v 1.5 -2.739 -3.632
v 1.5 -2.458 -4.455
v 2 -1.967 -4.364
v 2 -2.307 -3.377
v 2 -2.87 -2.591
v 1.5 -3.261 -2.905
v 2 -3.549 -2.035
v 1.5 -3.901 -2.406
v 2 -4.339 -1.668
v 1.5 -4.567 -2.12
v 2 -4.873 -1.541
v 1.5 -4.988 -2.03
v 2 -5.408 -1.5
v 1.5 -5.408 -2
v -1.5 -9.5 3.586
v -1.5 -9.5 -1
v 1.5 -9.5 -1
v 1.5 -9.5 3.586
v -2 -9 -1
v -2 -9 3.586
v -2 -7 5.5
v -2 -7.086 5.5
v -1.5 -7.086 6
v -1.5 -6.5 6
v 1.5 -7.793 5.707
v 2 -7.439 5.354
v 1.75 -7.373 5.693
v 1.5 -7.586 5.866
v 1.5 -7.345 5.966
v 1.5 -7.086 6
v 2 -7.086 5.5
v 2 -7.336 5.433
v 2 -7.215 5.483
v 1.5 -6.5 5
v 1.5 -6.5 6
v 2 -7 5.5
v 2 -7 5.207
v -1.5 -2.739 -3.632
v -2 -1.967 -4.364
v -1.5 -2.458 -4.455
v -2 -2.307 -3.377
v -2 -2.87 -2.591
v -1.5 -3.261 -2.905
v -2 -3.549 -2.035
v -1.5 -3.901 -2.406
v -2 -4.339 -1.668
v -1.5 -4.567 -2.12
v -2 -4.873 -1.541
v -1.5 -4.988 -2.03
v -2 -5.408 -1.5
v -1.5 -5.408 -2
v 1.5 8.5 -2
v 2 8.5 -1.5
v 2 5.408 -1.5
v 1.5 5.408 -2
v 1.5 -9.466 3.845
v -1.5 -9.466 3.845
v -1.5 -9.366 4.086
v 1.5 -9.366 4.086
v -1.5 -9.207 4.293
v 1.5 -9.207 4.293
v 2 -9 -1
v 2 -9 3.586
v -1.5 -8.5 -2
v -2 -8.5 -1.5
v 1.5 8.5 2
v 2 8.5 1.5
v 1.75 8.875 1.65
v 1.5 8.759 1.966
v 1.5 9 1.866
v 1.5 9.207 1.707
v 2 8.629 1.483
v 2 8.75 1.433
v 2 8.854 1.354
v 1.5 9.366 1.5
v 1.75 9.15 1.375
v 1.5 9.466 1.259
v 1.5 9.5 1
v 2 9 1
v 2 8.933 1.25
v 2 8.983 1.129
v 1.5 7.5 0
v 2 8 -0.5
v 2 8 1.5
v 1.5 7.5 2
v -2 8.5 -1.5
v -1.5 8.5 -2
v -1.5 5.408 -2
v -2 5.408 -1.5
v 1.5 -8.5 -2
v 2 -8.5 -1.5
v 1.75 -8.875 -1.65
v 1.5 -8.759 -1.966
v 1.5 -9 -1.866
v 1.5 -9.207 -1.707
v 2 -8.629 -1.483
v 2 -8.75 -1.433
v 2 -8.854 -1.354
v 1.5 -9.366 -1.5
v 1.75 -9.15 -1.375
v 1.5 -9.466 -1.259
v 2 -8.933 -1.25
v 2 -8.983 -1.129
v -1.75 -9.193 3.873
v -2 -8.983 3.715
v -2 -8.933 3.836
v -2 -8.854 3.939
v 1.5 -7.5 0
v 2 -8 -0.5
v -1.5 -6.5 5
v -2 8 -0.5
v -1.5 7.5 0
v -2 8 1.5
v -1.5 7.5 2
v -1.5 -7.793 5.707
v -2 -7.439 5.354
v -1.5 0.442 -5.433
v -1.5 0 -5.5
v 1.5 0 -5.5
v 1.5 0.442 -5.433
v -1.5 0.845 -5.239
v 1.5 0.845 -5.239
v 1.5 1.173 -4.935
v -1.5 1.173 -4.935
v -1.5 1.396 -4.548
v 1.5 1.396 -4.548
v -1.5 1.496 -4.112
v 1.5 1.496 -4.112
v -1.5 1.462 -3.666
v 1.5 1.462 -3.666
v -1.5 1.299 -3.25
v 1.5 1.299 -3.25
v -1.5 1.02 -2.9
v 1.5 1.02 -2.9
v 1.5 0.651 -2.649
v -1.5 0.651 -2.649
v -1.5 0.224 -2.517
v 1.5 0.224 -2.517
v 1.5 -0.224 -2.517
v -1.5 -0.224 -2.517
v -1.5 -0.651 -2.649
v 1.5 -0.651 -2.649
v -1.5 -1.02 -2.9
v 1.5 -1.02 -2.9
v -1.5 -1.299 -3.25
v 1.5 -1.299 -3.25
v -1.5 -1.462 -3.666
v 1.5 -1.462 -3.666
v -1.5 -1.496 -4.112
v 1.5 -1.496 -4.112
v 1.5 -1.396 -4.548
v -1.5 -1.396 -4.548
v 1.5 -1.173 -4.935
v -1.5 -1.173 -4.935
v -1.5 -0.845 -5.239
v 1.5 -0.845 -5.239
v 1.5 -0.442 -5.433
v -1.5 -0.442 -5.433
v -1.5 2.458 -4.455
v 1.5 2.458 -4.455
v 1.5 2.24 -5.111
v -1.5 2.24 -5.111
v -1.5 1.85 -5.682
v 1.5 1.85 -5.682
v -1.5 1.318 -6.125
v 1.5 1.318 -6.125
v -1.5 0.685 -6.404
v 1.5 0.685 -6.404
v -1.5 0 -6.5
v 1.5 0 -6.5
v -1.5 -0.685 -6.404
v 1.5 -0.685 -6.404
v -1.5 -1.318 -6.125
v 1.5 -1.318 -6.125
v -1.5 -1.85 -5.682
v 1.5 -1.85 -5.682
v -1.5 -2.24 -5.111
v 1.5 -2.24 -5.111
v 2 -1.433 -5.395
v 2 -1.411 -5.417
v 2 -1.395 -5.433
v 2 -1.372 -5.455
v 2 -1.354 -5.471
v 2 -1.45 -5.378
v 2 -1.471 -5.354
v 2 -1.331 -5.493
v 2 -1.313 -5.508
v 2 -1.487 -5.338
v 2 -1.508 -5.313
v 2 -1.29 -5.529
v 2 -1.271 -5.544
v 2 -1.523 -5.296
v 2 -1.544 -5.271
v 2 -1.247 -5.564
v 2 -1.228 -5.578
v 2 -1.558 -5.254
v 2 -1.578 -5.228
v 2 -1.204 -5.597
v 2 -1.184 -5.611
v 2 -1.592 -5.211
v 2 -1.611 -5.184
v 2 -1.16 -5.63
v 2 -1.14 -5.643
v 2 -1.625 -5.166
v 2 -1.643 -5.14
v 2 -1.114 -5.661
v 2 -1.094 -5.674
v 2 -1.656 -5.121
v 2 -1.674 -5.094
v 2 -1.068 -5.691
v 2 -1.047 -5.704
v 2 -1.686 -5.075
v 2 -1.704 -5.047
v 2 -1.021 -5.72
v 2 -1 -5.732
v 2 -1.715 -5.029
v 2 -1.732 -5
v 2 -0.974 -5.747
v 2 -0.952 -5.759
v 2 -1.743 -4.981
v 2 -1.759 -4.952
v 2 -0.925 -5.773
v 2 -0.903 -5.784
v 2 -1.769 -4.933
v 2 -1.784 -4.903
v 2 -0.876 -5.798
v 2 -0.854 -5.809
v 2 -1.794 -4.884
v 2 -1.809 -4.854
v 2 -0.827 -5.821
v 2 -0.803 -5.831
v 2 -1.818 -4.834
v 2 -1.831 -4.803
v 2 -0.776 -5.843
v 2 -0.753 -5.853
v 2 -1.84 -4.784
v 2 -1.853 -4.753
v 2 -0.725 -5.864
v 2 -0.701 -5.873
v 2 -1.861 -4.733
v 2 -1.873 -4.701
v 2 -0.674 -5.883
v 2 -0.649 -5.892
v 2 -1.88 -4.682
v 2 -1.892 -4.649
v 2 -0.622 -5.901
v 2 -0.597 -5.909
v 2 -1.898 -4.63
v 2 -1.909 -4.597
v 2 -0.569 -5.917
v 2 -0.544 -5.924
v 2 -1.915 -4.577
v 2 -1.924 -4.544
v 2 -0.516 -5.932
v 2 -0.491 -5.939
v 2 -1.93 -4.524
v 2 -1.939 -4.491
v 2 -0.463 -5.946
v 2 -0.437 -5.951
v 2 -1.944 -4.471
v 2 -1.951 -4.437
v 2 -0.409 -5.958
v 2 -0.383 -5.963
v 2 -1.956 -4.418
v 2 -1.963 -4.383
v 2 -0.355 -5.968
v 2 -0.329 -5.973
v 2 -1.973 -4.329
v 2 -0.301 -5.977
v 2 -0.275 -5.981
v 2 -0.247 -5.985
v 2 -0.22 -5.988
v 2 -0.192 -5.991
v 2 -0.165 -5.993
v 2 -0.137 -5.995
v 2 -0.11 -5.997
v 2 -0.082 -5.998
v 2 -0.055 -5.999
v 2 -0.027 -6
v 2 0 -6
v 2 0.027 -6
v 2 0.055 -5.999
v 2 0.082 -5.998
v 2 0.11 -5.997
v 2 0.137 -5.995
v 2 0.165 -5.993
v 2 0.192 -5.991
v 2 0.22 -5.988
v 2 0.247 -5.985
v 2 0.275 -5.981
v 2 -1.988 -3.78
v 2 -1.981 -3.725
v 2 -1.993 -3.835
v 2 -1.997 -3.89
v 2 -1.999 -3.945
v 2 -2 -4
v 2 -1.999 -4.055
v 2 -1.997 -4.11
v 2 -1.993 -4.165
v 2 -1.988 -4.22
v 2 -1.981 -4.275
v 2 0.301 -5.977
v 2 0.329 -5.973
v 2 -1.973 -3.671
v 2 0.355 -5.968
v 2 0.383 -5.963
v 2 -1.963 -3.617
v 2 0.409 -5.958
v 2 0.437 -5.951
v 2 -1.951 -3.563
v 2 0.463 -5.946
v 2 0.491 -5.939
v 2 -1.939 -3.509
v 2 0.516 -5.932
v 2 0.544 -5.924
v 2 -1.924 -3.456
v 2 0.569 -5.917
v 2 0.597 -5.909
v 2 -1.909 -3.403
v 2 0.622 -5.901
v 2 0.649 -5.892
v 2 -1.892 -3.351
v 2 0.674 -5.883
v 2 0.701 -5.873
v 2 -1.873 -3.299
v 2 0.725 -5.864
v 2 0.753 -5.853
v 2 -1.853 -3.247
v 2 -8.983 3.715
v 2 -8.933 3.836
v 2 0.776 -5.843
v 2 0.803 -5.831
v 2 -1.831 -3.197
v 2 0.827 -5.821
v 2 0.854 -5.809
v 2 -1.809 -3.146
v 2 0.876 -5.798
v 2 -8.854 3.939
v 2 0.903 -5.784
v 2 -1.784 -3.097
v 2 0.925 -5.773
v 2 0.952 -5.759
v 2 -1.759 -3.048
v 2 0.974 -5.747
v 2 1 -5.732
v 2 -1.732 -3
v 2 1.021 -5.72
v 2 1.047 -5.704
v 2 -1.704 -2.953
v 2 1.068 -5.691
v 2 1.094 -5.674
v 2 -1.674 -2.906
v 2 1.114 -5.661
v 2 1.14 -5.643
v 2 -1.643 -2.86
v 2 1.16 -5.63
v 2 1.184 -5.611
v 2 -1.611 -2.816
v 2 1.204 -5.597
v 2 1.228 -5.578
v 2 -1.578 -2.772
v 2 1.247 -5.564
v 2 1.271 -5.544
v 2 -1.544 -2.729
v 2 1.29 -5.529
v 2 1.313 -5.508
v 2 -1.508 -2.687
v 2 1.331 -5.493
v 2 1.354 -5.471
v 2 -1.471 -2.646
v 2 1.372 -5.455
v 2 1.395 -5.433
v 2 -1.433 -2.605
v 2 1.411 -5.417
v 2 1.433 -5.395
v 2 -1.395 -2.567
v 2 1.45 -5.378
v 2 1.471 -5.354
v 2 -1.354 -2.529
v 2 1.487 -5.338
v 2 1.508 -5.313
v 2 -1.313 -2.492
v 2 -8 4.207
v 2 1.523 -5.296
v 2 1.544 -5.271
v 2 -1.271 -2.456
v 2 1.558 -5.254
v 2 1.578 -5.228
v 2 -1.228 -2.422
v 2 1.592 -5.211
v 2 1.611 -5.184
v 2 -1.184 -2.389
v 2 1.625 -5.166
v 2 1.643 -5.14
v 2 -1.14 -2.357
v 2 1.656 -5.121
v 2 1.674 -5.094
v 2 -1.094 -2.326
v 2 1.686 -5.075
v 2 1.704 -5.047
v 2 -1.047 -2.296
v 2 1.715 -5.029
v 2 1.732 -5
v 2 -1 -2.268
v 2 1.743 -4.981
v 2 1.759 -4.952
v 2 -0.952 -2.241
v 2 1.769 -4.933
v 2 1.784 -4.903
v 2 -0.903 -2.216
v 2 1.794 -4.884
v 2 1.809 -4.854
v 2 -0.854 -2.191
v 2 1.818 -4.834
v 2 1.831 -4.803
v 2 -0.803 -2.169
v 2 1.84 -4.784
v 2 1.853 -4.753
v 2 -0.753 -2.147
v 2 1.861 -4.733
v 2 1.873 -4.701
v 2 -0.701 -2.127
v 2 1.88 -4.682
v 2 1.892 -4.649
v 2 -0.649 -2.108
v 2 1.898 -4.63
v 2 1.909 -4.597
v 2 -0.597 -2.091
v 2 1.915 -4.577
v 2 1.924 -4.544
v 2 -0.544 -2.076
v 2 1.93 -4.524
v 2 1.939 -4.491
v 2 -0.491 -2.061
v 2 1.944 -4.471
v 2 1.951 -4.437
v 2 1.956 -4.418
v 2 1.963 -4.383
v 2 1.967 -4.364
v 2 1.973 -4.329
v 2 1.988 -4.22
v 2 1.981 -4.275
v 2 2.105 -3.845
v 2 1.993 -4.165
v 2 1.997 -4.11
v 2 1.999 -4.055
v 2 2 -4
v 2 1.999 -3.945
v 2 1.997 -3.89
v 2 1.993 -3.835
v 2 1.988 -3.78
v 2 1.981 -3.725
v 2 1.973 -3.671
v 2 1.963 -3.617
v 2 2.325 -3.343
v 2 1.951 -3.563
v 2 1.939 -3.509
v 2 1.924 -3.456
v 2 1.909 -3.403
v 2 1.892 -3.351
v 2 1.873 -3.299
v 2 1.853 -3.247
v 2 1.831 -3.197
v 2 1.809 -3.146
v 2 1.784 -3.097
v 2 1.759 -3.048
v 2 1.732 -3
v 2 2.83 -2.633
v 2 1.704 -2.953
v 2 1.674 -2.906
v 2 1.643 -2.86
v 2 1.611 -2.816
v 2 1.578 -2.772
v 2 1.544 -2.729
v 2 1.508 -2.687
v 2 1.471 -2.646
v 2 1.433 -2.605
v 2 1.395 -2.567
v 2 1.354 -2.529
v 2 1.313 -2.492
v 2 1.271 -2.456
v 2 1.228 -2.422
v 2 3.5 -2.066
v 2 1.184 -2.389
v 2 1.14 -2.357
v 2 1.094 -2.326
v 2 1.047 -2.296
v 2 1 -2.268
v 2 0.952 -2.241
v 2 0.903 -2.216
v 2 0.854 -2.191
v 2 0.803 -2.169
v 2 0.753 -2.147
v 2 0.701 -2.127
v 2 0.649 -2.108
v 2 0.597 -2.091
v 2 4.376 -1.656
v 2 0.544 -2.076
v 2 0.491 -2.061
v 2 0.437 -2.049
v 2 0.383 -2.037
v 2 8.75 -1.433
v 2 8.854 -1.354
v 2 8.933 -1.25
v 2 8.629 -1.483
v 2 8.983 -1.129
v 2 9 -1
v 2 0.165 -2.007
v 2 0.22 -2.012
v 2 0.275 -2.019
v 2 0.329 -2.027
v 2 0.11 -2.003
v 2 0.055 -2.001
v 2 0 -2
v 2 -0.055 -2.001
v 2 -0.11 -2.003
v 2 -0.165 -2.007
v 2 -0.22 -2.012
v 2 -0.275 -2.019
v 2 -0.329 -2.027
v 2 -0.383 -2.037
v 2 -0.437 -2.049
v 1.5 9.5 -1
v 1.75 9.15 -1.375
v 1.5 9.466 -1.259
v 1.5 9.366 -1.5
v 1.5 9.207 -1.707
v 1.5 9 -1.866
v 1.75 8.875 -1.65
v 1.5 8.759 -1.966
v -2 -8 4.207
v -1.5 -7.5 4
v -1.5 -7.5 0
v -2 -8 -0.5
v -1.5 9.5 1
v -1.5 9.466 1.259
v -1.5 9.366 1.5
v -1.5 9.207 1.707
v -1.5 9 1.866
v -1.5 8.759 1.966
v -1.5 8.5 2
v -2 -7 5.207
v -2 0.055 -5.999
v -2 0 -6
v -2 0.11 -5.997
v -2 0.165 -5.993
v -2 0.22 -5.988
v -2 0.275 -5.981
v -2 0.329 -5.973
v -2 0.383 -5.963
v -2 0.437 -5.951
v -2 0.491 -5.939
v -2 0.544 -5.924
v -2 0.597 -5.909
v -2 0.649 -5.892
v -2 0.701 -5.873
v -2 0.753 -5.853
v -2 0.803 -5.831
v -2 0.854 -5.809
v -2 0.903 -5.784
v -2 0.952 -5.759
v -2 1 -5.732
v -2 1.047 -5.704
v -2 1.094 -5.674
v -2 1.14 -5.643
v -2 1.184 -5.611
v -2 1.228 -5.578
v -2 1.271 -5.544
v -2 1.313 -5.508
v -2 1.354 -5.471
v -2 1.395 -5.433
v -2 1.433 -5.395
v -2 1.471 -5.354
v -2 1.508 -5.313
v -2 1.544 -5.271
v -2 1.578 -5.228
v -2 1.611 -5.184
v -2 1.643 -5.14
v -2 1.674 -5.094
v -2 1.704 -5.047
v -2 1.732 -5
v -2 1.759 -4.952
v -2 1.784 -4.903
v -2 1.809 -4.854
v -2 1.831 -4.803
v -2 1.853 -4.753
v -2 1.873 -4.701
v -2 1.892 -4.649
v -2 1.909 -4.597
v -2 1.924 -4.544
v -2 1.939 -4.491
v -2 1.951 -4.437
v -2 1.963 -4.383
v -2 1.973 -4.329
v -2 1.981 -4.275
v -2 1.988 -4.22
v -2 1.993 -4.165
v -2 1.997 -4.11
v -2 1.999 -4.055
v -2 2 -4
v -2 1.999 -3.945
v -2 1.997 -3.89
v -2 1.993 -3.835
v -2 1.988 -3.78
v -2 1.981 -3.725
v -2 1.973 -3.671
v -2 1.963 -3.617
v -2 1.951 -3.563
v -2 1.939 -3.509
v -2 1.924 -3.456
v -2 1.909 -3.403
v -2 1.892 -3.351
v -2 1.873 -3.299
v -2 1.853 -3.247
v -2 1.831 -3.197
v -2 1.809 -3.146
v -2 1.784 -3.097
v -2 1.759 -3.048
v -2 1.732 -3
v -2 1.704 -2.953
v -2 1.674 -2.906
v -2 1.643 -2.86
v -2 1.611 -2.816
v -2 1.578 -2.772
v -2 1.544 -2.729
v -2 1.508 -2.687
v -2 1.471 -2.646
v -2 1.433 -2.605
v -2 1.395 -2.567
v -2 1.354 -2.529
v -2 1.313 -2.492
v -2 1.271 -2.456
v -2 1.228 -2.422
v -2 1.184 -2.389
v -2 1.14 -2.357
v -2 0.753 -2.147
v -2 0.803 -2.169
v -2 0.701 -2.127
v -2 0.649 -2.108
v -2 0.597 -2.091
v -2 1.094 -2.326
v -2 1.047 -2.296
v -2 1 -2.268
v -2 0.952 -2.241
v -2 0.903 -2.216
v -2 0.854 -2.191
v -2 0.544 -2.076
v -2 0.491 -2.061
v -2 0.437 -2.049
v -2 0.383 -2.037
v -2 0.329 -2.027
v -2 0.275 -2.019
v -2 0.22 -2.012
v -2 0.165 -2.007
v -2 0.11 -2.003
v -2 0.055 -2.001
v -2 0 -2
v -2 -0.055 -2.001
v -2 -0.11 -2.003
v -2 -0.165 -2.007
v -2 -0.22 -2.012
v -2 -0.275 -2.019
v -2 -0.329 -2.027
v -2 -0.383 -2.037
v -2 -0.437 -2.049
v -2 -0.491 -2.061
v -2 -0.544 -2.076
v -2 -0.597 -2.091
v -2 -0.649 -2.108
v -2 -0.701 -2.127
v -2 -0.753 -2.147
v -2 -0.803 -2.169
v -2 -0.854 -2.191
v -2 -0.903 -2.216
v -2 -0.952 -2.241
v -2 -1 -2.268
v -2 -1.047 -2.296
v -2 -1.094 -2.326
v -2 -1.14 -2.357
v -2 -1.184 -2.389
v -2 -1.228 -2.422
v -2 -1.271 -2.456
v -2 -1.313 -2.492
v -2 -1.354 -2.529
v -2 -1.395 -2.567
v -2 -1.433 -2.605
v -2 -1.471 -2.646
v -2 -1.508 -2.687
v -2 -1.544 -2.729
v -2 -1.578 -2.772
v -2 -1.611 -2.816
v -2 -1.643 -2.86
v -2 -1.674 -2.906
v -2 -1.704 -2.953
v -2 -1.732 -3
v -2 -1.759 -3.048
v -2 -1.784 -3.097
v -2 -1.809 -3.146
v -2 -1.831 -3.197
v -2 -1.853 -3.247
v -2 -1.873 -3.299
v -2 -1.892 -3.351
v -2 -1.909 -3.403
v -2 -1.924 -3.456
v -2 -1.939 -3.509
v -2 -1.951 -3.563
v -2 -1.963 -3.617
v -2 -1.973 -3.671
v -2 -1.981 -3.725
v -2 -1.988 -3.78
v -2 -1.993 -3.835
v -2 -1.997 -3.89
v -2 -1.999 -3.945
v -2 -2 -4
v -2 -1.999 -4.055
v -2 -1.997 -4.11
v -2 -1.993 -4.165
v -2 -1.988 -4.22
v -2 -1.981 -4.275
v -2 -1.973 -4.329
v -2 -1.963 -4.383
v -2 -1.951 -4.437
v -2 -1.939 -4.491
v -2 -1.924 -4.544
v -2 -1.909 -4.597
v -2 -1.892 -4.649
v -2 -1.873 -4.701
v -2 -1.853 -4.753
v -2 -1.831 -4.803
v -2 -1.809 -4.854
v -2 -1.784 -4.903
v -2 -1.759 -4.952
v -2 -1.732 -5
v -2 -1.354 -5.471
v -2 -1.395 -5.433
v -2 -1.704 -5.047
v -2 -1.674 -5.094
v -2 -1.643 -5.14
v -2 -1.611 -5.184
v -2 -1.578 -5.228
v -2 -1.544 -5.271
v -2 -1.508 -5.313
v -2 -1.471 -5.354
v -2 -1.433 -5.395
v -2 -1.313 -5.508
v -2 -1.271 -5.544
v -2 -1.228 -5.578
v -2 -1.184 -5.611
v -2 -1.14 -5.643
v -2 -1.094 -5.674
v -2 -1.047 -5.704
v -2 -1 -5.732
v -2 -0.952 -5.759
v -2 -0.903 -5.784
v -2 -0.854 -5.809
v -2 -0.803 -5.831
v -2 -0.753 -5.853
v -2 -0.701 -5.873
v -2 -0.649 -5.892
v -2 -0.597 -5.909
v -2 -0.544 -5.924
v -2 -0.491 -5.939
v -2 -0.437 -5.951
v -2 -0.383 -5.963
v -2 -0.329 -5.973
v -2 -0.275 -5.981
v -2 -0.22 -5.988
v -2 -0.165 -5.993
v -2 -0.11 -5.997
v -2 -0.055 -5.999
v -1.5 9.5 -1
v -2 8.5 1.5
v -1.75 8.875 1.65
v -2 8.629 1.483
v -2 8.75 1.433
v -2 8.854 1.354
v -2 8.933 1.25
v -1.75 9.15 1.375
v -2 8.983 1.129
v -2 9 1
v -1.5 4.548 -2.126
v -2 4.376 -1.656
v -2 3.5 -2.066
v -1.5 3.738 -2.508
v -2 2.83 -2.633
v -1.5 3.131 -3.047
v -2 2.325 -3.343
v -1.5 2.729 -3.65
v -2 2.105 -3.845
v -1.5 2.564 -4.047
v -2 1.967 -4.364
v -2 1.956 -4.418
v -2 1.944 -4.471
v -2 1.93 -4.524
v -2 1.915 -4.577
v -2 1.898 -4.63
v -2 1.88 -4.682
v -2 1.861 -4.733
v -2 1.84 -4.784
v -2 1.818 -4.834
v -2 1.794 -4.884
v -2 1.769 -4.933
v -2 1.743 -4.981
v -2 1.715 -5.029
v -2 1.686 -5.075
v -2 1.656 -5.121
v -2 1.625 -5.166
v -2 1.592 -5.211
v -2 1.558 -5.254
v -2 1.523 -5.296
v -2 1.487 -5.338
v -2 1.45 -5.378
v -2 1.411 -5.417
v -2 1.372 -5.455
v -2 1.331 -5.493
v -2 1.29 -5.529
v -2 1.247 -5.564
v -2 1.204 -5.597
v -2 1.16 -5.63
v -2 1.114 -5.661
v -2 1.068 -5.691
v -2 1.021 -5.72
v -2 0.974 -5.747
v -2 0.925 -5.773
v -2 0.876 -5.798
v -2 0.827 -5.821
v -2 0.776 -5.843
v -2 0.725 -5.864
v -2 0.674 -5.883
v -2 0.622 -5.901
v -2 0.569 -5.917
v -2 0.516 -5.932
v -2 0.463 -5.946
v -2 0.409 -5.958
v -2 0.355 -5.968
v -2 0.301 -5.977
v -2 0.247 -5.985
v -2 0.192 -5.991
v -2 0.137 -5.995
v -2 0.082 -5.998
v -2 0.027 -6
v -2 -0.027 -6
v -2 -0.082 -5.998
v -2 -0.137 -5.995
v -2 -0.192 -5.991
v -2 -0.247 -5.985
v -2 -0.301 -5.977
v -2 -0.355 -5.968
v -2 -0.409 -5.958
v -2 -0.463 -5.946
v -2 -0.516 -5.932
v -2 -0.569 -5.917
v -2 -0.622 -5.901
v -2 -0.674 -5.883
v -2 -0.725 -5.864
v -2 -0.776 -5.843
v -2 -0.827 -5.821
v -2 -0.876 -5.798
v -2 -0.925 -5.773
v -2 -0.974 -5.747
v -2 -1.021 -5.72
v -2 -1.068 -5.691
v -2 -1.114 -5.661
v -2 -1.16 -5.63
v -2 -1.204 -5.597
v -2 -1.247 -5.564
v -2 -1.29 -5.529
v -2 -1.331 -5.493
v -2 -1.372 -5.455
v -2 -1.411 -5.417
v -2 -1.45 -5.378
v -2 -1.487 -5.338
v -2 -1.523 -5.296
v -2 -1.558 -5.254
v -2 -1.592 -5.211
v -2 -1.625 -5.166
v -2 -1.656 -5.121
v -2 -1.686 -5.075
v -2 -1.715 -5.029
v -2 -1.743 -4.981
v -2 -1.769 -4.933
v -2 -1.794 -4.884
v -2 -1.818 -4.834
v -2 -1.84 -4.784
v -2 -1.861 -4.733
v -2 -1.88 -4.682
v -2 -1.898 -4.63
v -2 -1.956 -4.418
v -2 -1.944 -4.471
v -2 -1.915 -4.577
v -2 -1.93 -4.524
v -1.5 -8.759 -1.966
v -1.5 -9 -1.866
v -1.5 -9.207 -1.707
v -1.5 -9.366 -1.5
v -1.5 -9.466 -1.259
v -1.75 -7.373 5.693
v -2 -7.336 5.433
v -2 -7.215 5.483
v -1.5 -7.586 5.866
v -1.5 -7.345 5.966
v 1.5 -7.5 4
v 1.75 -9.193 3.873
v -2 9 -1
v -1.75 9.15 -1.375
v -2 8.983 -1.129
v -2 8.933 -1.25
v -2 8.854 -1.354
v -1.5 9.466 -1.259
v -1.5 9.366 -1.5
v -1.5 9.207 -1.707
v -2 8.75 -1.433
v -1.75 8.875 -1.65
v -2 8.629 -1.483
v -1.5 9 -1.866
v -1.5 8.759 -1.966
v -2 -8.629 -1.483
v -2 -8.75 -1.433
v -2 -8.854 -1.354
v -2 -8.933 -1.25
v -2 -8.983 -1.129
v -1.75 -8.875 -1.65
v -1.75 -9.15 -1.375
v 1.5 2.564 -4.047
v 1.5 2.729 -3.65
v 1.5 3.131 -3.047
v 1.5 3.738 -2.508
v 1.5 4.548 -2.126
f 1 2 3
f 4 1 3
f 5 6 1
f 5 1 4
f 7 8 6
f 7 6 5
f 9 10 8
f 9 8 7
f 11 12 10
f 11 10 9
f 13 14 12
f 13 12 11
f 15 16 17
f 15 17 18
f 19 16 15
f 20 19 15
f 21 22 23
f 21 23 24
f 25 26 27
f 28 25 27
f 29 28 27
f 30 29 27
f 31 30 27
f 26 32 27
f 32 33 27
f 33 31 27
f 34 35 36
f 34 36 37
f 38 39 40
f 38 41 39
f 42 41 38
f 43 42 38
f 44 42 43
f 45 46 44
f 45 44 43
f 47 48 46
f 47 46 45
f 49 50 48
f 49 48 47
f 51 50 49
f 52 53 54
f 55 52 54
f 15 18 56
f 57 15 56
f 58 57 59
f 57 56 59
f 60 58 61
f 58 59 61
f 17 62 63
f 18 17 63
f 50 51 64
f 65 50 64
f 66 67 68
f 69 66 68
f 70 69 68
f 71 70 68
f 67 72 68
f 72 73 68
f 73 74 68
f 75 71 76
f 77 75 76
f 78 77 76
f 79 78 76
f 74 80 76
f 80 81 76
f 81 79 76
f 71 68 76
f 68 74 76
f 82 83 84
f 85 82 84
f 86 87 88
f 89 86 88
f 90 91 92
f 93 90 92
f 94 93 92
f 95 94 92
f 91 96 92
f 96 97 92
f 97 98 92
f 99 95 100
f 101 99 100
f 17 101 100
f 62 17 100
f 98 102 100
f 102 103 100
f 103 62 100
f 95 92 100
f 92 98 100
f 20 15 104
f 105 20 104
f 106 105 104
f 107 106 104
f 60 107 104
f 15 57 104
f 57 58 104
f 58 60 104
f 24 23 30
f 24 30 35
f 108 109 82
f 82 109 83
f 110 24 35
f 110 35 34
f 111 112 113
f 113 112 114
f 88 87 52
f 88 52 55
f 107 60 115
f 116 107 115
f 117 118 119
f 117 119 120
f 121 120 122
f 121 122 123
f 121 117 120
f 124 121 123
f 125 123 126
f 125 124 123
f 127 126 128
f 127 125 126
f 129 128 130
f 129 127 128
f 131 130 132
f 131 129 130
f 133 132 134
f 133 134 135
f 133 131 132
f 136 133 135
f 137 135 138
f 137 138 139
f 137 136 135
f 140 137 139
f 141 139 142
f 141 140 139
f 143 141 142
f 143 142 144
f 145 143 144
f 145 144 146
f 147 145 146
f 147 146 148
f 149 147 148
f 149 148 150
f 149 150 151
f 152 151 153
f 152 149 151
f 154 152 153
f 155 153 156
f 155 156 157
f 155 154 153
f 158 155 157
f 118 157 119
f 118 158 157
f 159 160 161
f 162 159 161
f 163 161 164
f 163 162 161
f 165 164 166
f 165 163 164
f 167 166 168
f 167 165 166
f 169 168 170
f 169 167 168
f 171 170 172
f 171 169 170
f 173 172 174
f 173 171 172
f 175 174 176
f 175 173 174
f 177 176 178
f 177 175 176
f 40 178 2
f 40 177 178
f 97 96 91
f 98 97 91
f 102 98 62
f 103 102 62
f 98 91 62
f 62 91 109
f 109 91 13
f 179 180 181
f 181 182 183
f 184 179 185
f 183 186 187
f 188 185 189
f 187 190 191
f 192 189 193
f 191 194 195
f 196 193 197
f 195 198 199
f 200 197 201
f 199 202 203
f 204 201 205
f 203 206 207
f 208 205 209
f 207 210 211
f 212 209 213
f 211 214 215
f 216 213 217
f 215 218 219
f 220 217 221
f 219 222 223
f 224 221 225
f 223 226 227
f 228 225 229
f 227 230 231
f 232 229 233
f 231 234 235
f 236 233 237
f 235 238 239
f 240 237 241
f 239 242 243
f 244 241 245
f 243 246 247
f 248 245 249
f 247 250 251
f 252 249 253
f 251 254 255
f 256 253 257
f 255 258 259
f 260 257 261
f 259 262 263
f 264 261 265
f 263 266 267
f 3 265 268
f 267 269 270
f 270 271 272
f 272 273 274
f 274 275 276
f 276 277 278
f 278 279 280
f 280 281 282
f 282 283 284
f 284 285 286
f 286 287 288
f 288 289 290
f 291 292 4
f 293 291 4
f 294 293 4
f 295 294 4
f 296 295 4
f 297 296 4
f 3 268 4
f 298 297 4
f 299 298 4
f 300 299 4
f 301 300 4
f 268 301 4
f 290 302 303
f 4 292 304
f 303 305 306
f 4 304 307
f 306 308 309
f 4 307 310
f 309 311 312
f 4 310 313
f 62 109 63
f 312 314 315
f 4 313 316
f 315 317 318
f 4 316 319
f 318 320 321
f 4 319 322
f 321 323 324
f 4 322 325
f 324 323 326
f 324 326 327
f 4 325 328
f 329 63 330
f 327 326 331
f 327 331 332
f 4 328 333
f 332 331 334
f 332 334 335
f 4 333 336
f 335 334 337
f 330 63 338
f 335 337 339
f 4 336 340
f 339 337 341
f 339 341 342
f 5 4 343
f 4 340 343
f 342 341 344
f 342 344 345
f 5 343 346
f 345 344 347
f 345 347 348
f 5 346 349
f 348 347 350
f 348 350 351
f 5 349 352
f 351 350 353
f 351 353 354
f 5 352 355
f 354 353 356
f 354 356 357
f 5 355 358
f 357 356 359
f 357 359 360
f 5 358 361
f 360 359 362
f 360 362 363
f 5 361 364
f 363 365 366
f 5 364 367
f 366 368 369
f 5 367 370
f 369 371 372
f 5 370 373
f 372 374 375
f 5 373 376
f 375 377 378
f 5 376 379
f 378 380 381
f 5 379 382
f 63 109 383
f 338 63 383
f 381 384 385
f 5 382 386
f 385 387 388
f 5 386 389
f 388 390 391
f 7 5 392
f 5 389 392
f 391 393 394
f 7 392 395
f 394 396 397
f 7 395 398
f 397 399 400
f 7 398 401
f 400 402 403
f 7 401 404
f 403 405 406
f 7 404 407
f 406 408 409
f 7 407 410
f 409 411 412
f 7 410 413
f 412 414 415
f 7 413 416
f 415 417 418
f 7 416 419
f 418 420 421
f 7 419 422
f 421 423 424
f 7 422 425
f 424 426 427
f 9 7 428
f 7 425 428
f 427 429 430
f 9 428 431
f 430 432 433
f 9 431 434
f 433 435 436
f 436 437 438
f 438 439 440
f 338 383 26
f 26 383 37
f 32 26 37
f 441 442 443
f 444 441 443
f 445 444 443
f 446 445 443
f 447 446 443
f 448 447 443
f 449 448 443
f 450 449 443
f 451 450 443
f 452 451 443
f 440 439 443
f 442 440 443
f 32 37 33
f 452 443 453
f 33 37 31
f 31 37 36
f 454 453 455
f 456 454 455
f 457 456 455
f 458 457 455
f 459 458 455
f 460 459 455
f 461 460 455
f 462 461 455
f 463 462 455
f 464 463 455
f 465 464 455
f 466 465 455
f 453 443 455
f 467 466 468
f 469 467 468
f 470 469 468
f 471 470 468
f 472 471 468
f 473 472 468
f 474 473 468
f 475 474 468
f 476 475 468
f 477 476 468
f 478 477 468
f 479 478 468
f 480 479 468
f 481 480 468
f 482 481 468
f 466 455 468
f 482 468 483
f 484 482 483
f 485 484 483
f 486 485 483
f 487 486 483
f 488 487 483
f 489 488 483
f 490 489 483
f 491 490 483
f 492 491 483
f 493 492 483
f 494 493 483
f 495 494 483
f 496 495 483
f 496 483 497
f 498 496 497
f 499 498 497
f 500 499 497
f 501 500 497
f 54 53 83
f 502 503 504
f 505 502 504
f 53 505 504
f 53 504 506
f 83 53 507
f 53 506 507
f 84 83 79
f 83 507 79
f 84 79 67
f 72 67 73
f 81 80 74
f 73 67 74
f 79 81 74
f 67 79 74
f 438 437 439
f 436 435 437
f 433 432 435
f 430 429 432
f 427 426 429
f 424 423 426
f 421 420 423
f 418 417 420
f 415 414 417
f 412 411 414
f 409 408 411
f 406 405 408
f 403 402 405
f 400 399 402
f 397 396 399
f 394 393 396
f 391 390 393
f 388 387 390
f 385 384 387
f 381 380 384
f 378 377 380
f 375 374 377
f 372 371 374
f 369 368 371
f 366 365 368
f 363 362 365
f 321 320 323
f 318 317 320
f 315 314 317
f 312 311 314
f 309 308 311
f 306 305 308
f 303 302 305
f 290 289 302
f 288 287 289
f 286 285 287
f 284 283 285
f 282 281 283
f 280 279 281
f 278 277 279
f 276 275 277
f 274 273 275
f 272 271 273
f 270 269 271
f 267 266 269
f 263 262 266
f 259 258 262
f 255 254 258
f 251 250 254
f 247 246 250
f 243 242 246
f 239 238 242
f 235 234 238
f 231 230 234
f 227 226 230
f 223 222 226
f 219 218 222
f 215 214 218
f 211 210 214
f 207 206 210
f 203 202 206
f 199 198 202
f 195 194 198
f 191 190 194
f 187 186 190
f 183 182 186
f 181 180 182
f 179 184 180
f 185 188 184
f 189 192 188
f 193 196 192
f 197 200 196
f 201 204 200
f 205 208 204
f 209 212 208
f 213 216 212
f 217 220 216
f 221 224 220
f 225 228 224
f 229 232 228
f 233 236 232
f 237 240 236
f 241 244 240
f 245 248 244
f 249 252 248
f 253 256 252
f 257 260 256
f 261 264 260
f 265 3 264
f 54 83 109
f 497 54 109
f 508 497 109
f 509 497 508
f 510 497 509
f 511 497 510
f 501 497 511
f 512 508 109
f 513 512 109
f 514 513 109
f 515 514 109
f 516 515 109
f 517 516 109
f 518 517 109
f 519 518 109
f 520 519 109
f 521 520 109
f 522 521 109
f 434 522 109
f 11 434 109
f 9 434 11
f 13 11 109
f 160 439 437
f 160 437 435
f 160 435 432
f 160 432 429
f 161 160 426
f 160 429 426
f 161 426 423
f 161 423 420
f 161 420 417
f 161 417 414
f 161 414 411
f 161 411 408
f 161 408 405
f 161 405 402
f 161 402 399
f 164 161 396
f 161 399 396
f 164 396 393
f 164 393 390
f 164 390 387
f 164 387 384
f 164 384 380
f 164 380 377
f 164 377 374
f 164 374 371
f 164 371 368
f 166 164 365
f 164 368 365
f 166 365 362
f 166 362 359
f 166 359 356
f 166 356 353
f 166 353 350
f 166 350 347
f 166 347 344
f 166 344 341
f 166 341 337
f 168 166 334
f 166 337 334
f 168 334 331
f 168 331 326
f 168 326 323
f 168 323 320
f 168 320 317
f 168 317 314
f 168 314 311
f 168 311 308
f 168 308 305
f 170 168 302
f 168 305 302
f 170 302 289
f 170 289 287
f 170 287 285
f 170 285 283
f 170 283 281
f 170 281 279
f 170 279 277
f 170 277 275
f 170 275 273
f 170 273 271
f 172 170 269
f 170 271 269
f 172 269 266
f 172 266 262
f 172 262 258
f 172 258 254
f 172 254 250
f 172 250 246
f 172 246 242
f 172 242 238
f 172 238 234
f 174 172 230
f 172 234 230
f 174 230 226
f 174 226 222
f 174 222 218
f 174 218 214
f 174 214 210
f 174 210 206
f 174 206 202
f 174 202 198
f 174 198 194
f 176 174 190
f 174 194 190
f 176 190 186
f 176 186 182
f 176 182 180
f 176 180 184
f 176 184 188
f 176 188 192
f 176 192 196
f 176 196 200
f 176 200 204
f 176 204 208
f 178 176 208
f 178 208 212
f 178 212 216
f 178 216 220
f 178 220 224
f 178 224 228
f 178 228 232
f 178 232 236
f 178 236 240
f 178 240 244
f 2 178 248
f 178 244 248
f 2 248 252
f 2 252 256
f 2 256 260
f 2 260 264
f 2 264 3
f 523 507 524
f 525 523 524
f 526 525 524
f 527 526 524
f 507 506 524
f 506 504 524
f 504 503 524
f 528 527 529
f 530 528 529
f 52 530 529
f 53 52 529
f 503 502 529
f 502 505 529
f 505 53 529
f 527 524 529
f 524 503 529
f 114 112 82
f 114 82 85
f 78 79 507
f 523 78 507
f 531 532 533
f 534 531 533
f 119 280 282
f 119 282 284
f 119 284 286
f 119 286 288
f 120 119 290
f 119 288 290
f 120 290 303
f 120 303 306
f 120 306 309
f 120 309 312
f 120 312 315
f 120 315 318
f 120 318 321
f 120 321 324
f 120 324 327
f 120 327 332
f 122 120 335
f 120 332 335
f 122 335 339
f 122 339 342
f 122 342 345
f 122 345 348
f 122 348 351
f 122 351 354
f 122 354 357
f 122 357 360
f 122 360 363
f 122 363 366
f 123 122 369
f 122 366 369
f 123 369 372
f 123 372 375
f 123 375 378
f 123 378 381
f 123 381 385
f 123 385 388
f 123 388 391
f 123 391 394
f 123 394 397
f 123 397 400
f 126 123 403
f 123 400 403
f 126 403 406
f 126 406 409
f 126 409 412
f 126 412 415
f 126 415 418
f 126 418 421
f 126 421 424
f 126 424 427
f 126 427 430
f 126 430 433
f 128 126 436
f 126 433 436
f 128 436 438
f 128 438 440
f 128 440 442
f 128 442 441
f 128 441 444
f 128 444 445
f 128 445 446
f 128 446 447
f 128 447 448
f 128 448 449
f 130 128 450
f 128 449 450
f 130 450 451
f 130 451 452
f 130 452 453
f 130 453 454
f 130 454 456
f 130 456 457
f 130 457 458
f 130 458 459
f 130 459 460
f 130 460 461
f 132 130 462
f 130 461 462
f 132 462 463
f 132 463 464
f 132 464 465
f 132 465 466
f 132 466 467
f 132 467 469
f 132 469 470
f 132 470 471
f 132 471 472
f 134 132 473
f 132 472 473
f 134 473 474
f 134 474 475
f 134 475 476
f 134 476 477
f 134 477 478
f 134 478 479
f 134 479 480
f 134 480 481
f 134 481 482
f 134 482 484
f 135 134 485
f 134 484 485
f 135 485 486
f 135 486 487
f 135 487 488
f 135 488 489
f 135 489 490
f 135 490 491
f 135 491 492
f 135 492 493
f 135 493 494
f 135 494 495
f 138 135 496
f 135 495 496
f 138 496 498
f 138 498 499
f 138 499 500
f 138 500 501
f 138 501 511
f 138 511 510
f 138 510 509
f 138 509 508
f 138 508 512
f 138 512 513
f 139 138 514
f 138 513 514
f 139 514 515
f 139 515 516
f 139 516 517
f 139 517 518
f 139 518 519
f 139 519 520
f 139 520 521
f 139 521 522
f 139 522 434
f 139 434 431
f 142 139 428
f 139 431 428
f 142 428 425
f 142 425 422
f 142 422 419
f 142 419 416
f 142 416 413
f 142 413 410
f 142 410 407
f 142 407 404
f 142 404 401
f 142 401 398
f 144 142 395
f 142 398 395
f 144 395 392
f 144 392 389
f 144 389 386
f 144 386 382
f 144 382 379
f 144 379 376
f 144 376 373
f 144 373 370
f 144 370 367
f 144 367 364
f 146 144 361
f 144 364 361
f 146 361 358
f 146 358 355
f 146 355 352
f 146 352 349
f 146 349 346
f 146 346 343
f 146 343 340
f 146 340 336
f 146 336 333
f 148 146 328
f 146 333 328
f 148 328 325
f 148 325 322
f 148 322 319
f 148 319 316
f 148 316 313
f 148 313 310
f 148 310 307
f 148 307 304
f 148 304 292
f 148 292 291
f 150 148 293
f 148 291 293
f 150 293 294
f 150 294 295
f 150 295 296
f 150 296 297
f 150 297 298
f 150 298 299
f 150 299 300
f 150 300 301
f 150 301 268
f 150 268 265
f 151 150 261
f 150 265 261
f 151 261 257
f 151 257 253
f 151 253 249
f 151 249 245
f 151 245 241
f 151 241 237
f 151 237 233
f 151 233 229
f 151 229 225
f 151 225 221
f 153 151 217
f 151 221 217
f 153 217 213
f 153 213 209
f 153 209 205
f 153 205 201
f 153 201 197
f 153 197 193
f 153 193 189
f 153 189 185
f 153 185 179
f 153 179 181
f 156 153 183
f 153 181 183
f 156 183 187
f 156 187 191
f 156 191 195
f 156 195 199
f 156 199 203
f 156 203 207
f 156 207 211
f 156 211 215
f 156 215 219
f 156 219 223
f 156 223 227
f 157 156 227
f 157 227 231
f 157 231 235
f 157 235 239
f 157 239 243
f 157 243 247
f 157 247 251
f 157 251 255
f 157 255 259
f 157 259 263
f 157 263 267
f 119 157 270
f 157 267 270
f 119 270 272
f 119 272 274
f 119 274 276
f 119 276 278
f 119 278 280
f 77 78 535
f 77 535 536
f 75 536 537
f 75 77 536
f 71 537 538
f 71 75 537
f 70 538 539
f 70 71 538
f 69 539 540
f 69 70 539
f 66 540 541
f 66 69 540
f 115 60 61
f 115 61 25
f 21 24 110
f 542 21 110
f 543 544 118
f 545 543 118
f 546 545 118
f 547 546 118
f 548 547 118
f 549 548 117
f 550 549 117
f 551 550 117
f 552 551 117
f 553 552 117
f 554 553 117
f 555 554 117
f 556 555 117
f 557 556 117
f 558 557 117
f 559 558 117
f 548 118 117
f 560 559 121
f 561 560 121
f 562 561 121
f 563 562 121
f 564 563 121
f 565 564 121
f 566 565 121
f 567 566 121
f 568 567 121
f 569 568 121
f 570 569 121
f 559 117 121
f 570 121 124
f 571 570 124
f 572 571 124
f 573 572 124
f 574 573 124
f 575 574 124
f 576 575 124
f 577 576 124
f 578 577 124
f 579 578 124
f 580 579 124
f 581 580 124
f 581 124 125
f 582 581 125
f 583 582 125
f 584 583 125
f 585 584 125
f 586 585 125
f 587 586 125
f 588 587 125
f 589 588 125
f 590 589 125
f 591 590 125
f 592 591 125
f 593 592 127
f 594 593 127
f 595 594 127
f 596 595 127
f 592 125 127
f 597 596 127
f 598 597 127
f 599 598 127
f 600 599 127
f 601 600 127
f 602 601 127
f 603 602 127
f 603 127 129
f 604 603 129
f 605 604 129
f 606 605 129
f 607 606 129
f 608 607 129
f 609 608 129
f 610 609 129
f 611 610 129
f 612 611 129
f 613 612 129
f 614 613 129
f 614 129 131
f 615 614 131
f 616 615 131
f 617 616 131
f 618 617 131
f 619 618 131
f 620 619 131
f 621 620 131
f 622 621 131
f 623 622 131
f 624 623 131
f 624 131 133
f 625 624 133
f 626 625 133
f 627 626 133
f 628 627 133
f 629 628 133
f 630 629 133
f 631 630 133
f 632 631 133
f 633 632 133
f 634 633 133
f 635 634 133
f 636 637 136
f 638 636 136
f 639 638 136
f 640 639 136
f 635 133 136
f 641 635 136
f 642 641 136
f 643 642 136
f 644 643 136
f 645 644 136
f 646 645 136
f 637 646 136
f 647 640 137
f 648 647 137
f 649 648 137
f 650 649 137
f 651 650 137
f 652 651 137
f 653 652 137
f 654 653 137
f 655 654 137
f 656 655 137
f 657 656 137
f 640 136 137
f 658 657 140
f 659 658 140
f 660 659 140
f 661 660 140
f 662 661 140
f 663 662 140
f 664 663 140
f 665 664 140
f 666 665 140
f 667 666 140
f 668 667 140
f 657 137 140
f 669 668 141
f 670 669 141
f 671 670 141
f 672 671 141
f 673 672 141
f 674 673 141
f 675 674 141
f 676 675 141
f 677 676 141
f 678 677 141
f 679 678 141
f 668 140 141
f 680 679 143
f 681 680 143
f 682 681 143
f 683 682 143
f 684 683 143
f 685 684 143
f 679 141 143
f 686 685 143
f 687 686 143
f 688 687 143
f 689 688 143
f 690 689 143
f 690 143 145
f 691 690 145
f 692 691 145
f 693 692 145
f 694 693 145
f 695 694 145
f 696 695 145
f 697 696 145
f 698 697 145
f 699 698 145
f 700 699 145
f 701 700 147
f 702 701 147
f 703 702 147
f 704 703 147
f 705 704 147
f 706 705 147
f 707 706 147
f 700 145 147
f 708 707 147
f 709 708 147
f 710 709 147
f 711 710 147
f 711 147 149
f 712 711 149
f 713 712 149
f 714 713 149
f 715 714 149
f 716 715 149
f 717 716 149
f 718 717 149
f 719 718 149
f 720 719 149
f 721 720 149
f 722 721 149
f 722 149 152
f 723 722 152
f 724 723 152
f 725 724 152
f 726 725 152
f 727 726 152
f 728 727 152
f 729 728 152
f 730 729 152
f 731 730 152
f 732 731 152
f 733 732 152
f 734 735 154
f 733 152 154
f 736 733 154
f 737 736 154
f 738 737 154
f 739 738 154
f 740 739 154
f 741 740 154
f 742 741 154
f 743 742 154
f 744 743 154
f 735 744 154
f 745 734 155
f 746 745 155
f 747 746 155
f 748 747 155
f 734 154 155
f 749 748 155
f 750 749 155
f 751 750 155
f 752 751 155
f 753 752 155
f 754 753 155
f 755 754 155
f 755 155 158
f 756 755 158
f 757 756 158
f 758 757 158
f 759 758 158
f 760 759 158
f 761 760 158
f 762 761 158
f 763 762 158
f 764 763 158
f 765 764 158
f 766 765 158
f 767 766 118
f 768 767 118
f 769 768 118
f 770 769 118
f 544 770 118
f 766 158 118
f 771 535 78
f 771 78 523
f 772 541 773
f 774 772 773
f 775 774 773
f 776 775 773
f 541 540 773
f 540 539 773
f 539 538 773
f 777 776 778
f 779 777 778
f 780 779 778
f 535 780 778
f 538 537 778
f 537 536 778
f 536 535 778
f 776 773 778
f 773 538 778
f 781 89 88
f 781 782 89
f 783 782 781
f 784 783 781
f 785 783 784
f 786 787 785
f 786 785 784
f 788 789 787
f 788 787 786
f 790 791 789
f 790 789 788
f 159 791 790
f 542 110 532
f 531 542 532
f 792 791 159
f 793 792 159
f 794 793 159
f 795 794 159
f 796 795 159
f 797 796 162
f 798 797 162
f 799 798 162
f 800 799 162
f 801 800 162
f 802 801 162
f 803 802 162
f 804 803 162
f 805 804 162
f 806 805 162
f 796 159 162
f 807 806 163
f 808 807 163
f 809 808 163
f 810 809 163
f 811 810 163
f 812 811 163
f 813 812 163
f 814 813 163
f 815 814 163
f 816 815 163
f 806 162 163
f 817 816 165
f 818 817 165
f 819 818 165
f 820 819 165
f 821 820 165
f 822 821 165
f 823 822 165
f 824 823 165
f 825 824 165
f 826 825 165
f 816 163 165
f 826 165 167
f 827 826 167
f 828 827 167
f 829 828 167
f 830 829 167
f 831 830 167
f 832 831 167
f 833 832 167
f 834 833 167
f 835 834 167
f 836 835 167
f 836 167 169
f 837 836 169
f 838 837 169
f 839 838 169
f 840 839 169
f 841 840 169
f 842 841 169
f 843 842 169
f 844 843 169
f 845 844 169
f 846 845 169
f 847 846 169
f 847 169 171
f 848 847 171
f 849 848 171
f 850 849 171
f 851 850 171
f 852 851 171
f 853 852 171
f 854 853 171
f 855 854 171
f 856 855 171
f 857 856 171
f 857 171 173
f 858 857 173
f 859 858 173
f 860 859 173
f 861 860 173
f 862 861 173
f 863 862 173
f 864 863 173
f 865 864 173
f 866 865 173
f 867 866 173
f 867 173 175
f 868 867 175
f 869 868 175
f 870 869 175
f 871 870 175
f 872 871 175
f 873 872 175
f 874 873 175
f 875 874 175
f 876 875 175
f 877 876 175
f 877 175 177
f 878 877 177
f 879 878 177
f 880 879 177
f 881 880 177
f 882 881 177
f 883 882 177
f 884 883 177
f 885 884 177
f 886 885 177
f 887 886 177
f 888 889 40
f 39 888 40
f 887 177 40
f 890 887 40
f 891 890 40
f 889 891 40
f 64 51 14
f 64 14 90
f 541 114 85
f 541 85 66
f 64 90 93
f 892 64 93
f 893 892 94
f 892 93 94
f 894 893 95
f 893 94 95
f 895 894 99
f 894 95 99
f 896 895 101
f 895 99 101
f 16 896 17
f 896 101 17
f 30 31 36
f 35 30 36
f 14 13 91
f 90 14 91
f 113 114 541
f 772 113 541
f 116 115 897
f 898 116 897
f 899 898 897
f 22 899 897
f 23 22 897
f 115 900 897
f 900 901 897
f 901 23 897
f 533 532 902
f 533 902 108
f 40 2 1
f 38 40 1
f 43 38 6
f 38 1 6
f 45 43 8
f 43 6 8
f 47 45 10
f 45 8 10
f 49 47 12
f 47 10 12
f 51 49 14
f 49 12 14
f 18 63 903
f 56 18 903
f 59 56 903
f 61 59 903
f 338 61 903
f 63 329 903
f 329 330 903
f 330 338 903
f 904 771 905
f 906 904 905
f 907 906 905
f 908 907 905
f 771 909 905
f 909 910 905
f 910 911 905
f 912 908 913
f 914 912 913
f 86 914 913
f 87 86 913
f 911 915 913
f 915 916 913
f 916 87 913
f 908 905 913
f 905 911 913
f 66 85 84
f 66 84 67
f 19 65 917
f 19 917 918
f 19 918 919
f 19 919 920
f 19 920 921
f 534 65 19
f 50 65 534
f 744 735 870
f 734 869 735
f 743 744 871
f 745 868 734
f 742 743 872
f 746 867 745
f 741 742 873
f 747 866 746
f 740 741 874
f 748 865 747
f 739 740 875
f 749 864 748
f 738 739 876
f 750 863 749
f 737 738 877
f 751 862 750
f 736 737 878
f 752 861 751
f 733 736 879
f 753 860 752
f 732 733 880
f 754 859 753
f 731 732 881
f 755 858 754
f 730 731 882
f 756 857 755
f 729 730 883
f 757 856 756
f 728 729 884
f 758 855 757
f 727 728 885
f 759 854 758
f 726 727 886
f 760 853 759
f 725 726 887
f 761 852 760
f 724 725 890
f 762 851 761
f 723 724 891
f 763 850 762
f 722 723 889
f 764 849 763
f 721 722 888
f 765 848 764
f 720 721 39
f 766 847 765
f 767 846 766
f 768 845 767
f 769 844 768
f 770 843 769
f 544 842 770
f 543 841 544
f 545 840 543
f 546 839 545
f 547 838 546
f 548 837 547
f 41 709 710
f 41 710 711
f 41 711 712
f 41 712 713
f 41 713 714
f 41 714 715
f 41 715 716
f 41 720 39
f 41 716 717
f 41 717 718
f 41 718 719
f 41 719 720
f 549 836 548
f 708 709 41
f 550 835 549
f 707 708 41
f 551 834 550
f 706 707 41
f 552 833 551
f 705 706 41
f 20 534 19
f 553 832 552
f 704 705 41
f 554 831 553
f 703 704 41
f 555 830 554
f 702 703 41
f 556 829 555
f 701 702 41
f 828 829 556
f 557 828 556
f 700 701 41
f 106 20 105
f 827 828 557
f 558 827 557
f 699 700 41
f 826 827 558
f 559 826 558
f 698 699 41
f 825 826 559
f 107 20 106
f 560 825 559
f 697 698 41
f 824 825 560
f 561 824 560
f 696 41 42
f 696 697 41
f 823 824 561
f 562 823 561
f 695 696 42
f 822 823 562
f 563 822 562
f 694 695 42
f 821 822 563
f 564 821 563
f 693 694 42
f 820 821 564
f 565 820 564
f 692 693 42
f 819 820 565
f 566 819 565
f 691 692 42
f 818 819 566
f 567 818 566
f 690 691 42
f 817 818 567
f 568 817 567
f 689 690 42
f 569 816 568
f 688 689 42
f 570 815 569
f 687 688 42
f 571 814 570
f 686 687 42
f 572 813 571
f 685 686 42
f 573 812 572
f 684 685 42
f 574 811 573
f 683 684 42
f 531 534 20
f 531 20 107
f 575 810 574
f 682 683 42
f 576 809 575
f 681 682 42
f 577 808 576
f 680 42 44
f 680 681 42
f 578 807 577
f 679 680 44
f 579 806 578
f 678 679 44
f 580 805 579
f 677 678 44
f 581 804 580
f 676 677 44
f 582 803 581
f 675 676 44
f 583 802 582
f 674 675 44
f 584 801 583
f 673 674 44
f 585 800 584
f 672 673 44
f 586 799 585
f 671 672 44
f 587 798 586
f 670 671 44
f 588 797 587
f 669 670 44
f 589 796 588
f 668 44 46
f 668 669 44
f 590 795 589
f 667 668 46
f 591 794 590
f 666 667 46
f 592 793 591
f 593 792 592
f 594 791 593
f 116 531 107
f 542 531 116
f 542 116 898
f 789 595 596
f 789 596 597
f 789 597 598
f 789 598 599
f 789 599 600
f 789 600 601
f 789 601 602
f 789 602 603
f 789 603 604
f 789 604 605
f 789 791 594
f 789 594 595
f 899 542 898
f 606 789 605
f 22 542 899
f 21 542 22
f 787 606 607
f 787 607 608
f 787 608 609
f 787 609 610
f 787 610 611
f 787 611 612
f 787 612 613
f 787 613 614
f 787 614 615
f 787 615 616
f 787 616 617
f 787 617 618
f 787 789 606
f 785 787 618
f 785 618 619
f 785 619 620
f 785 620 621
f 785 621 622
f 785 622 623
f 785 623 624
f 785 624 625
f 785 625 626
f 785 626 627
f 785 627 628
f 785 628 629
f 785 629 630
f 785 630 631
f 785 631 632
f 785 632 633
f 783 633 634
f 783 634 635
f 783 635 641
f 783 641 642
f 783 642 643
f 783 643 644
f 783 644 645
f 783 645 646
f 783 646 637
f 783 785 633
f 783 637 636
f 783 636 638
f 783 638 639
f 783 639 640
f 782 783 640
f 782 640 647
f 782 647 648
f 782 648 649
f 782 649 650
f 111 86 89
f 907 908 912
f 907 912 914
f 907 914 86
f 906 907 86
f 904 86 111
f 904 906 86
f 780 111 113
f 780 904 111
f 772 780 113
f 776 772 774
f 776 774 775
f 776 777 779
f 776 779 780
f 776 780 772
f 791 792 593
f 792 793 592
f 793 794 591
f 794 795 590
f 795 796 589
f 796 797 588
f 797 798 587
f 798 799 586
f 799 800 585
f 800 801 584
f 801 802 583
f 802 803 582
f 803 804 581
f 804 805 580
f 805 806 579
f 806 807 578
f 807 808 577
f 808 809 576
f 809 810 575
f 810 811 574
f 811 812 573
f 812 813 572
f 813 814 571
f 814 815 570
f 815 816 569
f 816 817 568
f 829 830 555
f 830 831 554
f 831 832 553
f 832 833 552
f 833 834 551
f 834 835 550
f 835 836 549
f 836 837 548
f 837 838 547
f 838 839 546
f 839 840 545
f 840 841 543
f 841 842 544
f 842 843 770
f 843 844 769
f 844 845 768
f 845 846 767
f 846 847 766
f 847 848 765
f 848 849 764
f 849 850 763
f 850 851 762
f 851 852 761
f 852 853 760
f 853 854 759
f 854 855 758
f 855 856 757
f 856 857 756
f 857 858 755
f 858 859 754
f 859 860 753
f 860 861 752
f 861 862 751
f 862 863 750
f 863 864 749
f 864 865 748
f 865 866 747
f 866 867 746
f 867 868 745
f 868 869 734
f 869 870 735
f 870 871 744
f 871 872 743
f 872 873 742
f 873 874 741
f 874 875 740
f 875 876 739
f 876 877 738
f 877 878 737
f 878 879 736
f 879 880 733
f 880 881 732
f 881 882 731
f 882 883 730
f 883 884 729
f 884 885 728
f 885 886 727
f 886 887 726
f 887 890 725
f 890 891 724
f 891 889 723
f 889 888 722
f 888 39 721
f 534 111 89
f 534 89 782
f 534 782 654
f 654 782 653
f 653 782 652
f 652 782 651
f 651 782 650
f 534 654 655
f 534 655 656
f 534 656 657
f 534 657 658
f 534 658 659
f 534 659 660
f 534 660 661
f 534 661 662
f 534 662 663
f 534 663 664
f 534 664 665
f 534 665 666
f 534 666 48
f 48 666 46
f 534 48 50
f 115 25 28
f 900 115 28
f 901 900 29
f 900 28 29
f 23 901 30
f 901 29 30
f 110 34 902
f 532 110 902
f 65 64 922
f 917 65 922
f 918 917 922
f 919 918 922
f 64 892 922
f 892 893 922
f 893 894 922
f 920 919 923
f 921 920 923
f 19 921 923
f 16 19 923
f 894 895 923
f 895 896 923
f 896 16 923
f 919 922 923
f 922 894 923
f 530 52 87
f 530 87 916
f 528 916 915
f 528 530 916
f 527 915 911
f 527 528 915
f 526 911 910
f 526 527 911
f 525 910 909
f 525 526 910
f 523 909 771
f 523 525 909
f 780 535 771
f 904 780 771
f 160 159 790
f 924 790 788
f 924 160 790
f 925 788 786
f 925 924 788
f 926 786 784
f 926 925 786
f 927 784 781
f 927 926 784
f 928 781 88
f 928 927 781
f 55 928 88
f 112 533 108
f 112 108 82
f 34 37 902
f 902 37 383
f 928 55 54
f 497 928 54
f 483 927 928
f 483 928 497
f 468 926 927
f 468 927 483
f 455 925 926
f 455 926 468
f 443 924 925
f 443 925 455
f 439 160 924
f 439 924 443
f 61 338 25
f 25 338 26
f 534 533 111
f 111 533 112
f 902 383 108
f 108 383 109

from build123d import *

# Parameters (mm, degrees)
BOSS_EXTRUDE1_DEPTH      = 2
BOSS_EXTRUDE1_DEPTH_BACK = 2
SKETCH2_R                = 1.5
FILLET1_R                = 3
FILLET2_R                = 1
CHAMFER1_SIZE            = 0.5


with BuildPart() as part:
    # Sketch2 → Boss-Extrude1 (new, two sides: drawn at the far end of the back side and taken through both)
    with BuildSketch(Plane(origin=(0, 0, 0), x_dir=(0, 0, -1), z_dir=(1, 0, 0)).offset(-BOSS_EXTRUDE1_DEPTH_BACK)):
        with BuildLine():
            ThreePointArc((4, 2.5), (6.5, 0), (4, -2.5))
            Line((4, -2.5), (2, -2.5))
            Line((2, -2.5), (2, -9.5))
            Line((2, -9.5), (-4, -9.5))
            Line((-4, -9.5), (-6, -7.5))
            Line((-6, -7.5), (-6, -6.5))
            Line((-6, -6.5), (-5, -6.5))
            Line((-5, -6.5), (-4, -7.5))
            Line((-4, -7.5), (0, -7.5))
            Line((0, -7.5), (0, 7.5))
            Line((0, 7.5), (-2, 7.5))
            Line((-2, 7.5), (-2, 9.5))
            Line((-2, 9.5), (2, 9.5))
            Line((2, 9.5), (2, 2.5))
            Line((2, 2.5), (4, 2.5))
        make_face()
        with Locations((4, 0)):
            Circle(SKETCH2_R, mode=Mode.SUBTRACT)
    extrude(amount=BOSS_EXTRUDE1_DEPTH + BOSS_EXTRUDE1_DEPTH_BACK)

    # Fillet1
    fillet1_edges = [part.edges().sort_by_distance(p)[0] for p in [
        (0, 2.5, -2),
        (0, -2.5, -2),
    ]]
    fillet(fillet1_edges, radius=FILLET1_R)

    # Fillet2
    fillet2_edges = [part.edges().sort_by_distance(p)[0] for p in [
        (0, -9.5, -2),
        (0, -9.5, 4),
        (0, -7.5, 6),
        (0, 9.5, 2),
        (0, 9.5, -2),
    ]]
    fillet(fillet2_edges, radius=FILLET2_R)

    # Chamfer1
    chamfer1_edges = [part.edges().sort_by_distance(p)[0] for p in [
        (2, -8.5, 5),
        (2, -9.5, 1.292893219),
        (2, -6.954163457, -2),
        (2, 9.207106781, -1.707106781),
        (2, -9.207106781, -1.707106781),
        (2, -9.423879533, 3.96846987),
        (2, -7.46846987, 5.923879533),
        (2, 9.207106781, 1.707106781),
        (-2, 8, 2),
        (-2, -6.954163457, -2),
        (-2, -9.5, 1.292893219),
        (-2, -8.5, 5),
        (-2, 9.207106781, -1.707106781),
        (-2, -9.207106781, -1.707106781),
        (-2, -9.423879533, 3.96846987),
        (-2, -7.46846987, 5.923879533),
        (-2, 9.207106781, 1.707106781),
        (-2, 7.5, 1),
        (-2, 0, 0),
        (-2, -7.5, 2),
        (2, 0, -2.5),
        (2, 7.5, 1),
        (-2, -7, 4.5),
        (2, 0, 0),
        (2, -7.5, 2),
        (2, -7, 4.5),
        (2, -6.5, 5.5),
        (2, -6.792893219, 6),
        (-2, -6.5, 5.5),
        (-2, -6.792893219, 6),
        (-2, 0, -2.5),
        (2, 0, -6.5),
        (-2, 0, -6.5),
        (2, 6.954163457, -2),
        (-2, 6.954163457, -2),
        (2, 3.489495707, -2.693902257),
        (-2, 3.489545225, -2.693861055),
        (2, -3.489545225, -2.693861055),
        (-2, -3.489545225, -2.693861055),
        (2, 9.5, 0),
        (-2, 9.5, 0),
        (2, 8, 2),
    ]]
    chamfer(chamfer1_edges, length=CHAMFER1_SIZE - 0.0001)  # a hair under: the kernel refuses the full size


solid = part.part
